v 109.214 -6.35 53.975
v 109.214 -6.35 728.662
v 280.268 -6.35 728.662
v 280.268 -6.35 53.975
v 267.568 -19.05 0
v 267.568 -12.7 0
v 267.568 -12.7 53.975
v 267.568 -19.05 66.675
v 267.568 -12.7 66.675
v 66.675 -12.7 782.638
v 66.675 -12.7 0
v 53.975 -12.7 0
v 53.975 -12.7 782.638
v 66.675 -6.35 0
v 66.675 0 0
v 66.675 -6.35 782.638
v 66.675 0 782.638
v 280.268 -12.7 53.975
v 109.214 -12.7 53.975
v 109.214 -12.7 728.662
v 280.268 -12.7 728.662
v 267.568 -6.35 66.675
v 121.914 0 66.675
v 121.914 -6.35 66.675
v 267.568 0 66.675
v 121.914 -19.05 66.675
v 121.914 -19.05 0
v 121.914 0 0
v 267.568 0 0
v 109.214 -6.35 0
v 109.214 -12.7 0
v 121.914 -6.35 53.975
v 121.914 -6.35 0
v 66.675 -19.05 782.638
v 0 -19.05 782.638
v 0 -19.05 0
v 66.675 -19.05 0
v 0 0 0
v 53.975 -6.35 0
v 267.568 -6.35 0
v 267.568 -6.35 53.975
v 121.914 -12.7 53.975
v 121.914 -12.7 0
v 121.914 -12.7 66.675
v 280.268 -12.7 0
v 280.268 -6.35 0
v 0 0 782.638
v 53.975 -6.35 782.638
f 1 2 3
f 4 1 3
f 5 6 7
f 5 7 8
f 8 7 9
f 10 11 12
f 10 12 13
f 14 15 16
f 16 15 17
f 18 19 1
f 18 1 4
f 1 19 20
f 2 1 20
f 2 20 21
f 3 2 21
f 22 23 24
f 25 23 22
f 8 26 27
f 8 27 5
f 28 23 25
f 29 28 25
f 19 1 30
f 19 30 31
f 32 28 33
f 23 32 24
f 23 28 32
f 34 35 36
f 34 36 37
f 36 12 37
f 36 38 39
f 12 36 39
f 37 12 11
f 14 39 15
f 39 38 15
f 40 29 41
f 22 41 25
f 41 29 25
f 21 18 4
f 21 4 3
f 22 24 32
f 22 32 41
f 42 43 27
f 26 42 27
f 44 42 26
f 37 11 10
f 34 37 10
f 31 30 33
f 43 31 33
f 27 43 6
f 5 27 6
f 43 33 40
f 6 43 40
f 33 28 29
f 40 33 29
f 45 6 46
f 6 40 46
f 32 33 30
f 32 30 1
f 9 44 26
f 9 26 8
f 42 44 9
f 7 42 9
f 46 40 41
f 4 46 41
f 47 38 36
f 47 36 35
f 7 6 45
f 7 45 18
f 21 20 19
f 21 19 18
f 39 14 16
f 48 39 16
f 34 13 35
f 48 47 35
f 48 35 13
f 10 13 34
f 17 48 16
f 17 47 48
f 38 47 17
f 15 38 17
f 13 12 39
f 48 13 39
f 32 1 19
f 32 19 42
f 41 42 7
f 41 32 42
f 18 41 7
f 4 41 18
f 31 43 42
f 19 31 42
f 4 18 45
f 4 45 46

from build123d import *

# Parameters (mm, degrees)
F0_W      = 66.675
F0_H      = 782.6375
F1_DEPTH  = 19.05
F2_W      = 6.35
F2_H      = 782.6375
F3_DEPTH  = 12.7
F4_W      = 145.653125
F4_H      = 66.675
F5_DEPTH  = 19.05
F6_W      = 6.35
F6_H      = 66.675
F7_DEPTH  = 12.7
F8_W      = 6.35
F8_H      = 66.675
F9_DEPTH  = 12.7
F10_W     = 171.053125
F10_H     = 6.35
F11_DEPTH = 12.7
F12_W     = 171.053125
F12_H     = 674.6875
F13_DEPTH = 6.35


with BuildPart() as f1:
    # F0 (on Front) → F1 (new body)
    with BuildSketch(Plane.XZ):
        with Locations((33.3375, 391.31875)):
            Rectangle(F0_W, F0_H)
    extrude(amount=F1_DEPTH)

    # F2 (on face) → F3 (cut)
    with BuildSketch(Plane.YZ.offset(66.675)):
        with Locations((-9.525, 391.31875)):
            Rectangle(F2_W, F2_H)
    extrude(amount=-F3_DEPTH, mode=Mode.SUBTRACT)


with BuildPart() as f5:
    # F4 (on Front) → F5 (new body)
    with BuildSketch(Plane.XZ):
        with Locations((194.7409492493, 33.3375)):
            Rectangle(F4_W, F4_H)
    extrude(amount=F5_DEPTH)

    # F6 (on face) → F7 (join)
    with BuildSketch(Plane(origin=(121.9143867493, 0, 0), x_dir=(0, -1, 0), z_dir=(-1, 0, 0))):
        with Locations((9.525, 33.3375)):
            Rectangle(F6_W, F6_H)
    extrude(amount=F7_DEPTH)

    # F8 (on face) → F9 (join)
    with BuildSketch(Plane.YZ.offset(267.5675117493)):
        with Locations((-9.525, 33.3375)):
            Rectangle(F8_W, F8_H)
    extrude(amount=F9_DEPTH)

    # F10 (on face) → F11 (cut)
    with BuildSketch(Plane.XY.offset(66.675)):
        with Locations((194.7409492493, -9.525)):
            Rectangle(F10_W, F10_H)
    extrude(amount=-F11_DEPTH, mode=Mode.SUBTRACT)


with BuildPart() as f13:
    # F12 (on face) → F13 (new body, through all)
    with BuildSketch(Plane.XZ.offset(12.7)):
        with Locations((194.7409492493, 391.31875)):
            Rectangle(F12_W, F12_H)
    extrude(amount=-F13_DEPTH)


solid = Compound([f1.part, f5.part, f13.part])
